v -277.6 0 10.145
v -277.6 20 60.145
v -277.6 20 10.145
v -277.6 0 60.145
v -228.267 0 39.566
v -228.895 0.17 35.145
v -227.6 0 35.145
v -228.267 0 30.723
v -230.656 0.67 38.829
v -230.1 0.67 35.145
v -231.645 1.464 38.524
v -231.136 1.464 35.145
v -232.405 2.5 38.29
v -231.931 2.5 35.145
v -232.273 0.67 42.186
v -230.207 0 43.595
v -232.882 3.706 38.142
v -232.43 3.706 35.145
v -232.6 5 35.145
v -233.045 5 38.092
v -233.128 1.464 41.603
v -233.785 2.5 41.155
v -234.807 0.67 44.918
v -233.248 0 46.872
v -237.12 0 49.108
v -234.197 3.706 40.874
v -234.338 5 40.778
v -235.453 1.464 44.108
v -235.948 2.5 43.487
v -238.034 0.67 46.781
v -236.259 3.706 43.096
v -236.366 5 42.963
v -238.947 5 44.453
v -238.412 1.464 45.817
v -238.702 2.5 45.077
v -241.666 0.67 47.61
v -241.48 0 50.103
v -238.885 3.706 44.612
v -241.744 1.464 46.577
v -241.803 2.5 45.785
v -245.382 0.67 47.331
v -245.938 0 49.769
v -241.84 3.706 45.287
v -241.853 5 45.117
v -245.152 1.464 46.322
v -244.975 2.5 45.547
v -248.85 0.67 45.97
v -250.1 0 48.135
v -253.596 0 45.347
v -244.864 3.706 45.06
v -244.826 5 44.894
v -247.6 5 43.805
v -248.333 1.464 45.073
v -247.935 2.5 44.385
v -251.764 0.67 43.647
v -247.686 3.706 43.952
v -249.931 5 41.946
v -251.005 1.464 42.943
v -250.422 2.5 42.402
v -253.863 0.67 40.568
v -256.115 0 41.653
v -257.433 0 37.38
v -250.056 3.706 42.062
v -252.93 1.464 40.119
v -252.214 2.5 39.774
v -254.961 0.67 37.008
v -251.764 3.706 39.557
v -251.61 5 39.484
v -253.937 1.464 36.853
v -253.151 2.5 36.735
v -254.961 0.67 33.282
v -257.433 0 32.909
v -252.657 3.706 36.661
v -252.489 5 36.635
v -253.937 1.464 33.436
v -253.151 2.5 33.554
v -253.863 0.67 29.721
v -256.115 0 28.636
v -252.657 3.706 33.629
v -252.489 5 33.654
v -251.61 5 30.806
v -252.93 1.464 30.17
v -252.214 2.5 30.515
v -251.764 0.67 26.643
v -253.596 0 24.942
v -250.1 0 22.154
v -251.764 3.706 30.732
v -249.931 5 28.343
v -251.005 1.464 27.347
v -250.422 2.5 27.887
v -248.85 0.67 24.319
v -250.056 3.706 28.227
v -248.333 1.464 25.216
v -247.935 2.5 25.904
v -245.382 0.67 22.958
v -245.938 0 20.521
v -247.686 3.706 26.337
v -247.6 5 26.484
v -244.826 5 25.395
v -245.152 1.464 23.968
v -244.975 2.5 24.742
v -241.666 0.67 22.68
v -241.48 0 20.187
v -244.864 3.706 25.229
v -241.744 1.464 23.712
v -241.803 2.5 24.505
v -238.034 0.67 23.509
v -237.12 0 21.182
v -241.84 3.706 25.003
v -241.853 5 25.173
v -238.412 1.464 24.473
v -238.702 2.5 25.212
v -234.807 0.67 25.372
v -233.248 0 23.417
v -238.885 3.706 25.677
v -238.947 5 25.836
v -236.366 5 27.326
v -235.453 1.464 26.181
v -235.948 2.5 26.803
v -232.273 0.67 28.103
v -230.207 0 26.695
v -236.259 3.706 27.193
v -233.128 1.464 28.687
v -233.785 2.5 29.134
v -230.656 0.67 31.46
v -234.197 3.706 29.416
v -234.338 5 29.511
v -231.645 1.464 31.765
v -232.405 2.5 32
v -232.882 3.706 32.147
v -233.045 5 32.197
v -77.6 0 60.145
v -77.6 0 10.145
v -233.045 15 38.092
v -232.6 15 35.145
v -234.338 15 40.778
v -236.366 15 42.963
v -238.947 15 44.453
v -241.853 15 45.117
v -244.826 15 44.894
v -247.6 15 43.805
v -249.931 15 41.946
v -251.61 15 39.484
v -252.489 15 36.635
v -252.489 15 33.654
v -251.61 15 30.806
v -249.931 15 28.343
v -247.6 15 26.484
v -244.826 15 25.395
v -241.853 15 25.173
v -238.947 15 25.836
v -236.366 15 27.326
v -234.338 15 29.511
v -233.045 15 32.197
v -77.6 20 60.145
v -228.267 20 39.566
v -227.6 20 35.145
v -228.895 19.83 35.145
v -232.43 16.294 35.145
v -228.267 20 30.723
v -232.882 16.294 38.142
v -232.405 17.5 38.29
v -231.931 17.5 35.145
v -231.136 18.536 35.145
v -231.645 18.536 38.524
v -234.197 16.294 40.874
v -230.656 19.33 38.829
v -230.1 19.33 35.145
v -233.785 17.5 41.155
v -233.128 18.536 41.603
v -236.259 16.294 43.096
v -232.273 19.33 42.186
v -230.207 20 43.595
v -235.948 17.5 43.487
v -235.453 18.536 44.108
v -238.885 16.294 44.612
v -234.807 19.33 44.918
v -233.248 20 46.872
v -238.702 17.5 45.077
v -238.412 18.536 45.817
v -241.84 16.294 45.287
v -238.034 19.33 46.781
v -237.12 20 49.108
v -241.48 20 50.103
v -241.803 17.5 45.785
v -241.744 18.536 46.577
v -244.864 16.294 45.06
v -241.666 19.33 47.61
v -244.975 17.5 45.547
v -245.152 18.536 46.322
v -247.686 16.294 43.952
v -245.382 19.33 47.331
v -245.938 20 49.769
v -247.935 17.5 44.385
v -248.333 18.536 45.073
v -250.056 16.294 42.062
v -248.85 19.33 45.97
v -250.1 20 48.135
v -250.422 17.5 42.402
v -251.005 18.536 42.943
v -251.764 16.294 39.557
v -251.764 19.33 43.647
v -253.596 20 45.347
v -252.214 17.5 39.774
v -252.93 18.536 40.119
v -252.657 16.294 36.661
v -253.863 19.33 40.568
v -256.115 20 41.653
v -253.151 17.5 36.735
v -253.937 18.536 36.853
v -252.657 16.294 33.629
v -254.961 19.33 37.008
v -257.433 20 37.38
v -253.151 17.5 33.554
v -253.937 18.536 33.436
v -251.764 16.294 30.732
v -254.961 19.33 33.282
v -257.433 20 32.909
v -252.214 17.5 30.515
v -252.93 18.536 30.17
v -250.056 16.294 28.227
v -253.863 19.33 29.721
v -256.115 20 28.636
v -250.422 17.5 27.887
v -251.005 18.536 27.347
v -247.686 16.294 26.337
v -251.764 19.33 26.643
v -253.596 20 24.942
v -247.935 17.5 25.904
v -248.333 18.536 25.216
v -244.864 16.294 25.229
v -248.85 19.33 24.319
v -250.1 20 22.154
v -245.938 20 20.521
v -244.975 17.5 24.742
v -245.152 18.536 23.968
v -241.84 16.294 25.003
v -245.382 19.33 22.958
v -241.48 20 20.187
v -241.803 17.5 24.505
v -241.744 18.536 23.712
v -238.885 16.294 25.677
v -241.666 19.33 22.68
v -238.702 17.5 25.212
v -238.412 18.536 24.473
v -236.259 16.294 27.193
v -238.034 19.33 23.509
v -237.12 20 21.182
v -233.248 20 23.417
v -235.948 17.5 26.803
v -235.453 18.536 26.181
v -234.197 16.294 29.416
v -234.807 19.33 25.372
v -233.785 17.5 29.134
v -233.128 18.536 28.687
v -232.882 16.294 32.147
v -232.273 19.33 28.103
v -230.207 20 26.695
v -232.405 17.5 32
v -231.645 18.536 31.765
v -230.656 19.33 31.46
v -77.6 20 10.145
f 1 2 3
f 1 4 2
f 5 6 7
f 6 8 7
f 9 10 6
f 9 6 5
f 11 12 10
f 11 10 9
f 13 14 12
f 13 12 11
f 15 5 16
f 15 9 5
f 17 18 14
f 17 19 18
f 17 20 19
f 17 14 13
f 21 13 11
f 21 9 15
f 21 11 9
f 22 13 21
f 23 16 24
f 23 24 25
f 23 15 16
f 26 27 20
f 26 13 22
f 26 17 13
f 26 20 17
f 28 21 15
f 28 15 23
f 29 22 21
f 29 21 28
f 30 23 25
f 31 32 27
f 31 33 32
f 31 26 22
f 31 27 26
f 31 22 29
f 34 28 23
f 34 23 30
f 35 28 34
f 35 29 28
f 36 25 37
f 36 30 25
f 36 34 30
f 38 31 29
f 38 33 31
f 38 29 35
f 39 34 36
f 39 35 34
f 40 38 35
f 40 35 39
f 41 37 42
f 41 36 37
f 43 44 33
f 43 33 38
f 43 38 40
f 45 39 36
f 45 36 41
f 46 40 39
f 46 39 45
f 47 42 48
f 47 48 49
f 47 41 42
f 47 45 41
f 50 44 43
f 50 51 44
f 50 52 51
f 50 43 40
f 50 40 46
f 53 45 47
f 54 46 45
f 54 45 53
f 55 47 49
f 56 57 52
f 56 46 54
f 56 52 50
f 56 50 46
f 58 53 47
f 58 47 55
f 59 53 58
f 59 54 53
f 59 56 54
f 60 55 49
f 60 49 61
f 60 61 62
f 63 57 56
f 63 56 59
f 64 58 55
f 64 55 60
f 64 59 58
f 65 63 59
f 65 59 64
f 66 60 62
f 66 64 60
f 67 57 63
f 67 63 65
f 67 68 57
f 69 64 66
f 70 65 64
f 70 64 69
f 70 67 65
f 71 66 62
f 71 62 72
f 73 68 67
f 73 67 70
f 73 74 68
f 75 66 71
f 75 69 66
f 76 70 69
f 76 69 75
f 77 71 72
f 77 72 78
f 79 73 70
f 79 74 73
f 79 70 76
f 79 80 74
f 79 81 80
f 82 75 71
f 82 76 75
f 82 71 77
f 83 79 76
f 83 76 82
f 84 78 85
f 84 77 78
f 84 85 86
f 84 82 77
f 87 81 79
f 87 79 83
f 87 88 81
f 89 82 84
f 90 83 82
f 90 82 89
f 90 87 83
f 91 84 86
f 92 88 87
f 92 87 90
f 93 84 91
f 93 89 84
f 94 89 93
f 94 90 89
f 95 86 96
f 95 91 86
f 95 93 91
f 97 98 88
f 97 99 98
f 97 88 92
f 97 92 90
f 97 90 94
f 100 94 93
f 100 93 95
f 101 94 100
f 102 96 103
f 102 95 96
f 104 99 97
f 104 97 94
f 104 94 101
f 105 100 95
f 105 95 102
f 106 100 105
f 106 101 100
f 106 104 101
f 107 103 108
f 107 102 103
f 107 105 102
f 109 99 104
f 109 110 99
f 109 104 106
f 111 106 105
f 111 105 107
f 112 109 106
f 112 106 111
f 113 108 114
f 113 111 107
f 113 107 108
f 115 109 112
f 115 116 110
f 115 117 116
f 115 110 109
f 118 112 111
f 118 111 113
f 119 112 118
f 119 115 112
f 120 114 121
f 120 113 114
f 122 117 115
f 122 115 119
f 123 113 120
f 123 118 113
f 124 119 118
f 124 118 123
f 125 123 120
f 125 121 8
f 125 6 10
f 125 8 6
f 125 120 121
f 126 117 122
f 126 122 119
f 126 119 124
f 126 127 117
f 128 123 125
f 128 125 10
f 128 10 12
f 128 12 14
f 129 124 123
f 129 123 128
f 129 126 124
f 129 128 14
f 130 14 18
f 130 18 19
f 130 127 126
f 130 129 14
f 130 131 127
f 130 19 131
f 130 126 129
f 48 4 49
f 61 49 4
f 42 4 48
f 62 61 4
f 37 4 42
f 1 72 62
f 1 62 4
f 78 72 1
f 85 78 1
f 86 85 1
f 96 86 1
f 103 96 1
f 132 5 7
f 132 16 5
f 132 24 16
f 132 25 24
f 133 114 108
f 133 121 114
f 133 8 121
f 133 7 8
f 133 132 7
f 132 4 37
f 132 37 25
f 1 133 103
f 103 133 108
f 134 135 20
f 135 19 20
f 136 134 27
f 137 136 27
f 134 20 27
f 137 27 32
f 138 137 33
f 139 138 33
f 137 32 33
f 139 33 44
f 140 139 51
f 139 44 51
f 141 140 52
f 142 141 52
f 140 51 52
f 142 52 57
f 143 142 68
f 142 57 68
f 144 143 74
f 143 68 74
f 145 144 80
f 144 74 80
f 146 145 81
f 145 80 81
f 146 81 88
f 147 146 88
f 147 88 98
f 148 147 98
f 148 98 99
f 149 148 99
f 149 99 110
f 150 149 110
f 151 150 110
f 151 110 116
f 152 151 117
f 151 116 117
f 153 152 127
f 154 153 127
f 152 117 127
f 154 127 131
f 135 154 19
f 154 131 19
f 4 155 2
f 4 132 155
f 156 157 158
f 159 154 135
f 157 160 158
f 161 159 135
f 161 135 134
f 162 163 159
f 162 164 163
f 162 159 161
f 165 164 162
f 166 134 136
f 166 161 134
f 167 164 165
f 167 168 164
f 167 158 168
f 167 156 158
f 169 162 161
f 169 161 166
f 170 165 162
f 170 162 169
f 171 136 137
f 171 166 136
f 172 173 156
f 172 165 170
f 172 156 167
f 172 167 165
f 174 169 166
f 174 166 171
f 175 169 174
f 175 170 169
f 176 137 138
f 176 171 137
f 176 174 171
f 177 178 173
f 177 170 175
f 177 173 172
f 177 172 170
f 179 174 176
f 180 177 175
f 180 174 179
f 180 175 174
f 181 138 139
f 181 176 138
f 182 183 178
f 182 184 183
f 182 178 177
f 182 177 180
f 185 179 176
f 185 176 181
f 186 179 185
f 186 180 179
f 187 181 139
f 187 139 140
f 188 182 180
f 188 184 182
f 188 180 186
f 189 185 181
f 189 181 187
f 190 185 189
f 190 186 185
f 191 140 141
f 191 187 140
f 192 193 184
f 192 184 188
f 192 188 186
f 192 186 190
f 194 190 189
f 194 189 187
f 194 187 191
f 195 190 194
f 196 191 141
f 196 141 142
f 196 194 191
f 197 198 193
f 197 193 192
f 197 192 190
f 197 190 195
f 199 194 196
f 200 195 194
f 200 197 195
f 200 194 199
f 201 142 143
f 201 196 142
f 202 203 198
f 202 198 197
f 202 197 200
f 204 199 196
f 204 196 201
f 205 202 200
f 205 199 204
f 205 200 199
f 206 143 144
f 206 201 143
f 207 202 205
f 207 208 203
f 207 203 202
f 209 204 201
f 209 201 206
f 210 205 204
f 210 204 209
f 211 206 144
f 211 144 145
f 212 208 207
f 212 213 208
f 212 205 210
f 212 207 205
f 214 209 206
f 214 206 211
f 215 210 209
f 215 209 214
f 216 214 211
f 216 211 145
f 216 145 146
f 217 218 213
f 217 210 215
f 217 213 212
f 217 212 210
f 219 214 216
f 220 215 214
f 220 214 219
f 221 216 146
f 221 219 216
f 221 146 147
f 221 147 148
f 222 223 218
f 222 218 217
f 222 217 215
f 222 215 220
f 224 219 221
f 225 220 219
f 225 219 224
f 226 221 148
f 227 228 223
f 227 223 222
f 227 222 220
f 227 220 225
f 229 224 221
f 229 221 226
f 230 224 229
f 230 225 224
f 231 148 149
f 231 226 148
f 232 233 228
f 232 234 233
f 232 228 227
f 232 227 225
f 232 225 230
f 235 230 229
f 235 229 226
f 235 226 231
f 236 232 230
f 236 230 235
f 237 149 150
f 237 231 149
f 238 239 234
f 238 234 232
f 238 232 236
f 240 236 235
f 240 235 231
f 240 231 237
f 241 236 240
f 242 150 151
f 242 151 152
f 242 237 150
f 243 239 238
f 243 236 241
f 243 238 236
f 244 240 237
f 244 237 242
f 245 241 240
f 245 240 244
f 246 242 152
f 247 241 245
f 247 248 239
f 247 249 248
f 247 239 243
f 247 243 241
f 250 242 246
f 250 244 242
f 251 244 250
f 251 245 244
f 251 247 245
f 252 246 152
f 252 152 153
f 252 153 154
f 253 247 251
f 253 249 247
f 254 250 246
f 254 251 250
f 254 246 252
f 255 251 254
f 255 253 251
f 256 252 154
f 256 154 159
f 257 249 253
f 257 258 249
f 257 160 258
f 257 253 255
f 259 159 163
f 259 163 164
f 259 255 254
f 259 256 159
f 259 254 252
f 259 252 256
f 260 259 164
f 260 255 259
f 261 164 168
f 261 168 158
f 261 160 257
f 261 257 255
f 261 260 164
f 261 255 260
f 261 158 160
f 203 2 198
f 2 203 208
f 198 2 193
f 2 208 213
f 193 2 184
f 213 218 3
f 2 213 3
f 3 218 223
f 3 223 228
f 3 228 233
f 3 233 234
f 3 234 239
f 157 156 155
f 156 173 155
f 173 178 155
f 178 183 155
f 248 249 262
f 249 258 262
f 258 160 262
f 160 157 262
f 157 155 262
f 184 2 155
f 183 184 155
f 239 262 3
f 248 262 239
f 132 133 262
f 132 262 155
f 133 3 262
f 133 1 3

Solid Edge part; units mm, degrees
sketch "Sketch1" plane through (0, 0, 0) normal (0, -1, 0) x (1, 0, 0)
  line L0 (-77.6005, 10.1447) -> (-77.6005, 60.1447)
  line L1 (-77.6005, 60.1447) -> (-277.6005, 60.1447)
  line L2 (-277.6005, 60.1447) -> (-277.6005, 10.1447)
  line L3 (-277.6005, 10.1447) -> (-77.6005, 10.1447)
  dimension "D1" = 200
extrude "Protrusion1" add sketch "Sketch1" against normal blind 20
sketch "Sketch2" plane through (-102.6005, 0, 35.1447) normal (0, -1, 0) x (1, 0, 0)
  circle A0 centre (-140, 0) radius 10
  dimension "D1" = 35
extrude "Cutout1" cut sketch "Sketch2" against normal through all
fillet "Round_2" radius 5 1 edges at (-252.6005, 0, 35.1447)
fillet "Round_3" radius 5 1 edges at (-242.6005, 20, 45.1447)
